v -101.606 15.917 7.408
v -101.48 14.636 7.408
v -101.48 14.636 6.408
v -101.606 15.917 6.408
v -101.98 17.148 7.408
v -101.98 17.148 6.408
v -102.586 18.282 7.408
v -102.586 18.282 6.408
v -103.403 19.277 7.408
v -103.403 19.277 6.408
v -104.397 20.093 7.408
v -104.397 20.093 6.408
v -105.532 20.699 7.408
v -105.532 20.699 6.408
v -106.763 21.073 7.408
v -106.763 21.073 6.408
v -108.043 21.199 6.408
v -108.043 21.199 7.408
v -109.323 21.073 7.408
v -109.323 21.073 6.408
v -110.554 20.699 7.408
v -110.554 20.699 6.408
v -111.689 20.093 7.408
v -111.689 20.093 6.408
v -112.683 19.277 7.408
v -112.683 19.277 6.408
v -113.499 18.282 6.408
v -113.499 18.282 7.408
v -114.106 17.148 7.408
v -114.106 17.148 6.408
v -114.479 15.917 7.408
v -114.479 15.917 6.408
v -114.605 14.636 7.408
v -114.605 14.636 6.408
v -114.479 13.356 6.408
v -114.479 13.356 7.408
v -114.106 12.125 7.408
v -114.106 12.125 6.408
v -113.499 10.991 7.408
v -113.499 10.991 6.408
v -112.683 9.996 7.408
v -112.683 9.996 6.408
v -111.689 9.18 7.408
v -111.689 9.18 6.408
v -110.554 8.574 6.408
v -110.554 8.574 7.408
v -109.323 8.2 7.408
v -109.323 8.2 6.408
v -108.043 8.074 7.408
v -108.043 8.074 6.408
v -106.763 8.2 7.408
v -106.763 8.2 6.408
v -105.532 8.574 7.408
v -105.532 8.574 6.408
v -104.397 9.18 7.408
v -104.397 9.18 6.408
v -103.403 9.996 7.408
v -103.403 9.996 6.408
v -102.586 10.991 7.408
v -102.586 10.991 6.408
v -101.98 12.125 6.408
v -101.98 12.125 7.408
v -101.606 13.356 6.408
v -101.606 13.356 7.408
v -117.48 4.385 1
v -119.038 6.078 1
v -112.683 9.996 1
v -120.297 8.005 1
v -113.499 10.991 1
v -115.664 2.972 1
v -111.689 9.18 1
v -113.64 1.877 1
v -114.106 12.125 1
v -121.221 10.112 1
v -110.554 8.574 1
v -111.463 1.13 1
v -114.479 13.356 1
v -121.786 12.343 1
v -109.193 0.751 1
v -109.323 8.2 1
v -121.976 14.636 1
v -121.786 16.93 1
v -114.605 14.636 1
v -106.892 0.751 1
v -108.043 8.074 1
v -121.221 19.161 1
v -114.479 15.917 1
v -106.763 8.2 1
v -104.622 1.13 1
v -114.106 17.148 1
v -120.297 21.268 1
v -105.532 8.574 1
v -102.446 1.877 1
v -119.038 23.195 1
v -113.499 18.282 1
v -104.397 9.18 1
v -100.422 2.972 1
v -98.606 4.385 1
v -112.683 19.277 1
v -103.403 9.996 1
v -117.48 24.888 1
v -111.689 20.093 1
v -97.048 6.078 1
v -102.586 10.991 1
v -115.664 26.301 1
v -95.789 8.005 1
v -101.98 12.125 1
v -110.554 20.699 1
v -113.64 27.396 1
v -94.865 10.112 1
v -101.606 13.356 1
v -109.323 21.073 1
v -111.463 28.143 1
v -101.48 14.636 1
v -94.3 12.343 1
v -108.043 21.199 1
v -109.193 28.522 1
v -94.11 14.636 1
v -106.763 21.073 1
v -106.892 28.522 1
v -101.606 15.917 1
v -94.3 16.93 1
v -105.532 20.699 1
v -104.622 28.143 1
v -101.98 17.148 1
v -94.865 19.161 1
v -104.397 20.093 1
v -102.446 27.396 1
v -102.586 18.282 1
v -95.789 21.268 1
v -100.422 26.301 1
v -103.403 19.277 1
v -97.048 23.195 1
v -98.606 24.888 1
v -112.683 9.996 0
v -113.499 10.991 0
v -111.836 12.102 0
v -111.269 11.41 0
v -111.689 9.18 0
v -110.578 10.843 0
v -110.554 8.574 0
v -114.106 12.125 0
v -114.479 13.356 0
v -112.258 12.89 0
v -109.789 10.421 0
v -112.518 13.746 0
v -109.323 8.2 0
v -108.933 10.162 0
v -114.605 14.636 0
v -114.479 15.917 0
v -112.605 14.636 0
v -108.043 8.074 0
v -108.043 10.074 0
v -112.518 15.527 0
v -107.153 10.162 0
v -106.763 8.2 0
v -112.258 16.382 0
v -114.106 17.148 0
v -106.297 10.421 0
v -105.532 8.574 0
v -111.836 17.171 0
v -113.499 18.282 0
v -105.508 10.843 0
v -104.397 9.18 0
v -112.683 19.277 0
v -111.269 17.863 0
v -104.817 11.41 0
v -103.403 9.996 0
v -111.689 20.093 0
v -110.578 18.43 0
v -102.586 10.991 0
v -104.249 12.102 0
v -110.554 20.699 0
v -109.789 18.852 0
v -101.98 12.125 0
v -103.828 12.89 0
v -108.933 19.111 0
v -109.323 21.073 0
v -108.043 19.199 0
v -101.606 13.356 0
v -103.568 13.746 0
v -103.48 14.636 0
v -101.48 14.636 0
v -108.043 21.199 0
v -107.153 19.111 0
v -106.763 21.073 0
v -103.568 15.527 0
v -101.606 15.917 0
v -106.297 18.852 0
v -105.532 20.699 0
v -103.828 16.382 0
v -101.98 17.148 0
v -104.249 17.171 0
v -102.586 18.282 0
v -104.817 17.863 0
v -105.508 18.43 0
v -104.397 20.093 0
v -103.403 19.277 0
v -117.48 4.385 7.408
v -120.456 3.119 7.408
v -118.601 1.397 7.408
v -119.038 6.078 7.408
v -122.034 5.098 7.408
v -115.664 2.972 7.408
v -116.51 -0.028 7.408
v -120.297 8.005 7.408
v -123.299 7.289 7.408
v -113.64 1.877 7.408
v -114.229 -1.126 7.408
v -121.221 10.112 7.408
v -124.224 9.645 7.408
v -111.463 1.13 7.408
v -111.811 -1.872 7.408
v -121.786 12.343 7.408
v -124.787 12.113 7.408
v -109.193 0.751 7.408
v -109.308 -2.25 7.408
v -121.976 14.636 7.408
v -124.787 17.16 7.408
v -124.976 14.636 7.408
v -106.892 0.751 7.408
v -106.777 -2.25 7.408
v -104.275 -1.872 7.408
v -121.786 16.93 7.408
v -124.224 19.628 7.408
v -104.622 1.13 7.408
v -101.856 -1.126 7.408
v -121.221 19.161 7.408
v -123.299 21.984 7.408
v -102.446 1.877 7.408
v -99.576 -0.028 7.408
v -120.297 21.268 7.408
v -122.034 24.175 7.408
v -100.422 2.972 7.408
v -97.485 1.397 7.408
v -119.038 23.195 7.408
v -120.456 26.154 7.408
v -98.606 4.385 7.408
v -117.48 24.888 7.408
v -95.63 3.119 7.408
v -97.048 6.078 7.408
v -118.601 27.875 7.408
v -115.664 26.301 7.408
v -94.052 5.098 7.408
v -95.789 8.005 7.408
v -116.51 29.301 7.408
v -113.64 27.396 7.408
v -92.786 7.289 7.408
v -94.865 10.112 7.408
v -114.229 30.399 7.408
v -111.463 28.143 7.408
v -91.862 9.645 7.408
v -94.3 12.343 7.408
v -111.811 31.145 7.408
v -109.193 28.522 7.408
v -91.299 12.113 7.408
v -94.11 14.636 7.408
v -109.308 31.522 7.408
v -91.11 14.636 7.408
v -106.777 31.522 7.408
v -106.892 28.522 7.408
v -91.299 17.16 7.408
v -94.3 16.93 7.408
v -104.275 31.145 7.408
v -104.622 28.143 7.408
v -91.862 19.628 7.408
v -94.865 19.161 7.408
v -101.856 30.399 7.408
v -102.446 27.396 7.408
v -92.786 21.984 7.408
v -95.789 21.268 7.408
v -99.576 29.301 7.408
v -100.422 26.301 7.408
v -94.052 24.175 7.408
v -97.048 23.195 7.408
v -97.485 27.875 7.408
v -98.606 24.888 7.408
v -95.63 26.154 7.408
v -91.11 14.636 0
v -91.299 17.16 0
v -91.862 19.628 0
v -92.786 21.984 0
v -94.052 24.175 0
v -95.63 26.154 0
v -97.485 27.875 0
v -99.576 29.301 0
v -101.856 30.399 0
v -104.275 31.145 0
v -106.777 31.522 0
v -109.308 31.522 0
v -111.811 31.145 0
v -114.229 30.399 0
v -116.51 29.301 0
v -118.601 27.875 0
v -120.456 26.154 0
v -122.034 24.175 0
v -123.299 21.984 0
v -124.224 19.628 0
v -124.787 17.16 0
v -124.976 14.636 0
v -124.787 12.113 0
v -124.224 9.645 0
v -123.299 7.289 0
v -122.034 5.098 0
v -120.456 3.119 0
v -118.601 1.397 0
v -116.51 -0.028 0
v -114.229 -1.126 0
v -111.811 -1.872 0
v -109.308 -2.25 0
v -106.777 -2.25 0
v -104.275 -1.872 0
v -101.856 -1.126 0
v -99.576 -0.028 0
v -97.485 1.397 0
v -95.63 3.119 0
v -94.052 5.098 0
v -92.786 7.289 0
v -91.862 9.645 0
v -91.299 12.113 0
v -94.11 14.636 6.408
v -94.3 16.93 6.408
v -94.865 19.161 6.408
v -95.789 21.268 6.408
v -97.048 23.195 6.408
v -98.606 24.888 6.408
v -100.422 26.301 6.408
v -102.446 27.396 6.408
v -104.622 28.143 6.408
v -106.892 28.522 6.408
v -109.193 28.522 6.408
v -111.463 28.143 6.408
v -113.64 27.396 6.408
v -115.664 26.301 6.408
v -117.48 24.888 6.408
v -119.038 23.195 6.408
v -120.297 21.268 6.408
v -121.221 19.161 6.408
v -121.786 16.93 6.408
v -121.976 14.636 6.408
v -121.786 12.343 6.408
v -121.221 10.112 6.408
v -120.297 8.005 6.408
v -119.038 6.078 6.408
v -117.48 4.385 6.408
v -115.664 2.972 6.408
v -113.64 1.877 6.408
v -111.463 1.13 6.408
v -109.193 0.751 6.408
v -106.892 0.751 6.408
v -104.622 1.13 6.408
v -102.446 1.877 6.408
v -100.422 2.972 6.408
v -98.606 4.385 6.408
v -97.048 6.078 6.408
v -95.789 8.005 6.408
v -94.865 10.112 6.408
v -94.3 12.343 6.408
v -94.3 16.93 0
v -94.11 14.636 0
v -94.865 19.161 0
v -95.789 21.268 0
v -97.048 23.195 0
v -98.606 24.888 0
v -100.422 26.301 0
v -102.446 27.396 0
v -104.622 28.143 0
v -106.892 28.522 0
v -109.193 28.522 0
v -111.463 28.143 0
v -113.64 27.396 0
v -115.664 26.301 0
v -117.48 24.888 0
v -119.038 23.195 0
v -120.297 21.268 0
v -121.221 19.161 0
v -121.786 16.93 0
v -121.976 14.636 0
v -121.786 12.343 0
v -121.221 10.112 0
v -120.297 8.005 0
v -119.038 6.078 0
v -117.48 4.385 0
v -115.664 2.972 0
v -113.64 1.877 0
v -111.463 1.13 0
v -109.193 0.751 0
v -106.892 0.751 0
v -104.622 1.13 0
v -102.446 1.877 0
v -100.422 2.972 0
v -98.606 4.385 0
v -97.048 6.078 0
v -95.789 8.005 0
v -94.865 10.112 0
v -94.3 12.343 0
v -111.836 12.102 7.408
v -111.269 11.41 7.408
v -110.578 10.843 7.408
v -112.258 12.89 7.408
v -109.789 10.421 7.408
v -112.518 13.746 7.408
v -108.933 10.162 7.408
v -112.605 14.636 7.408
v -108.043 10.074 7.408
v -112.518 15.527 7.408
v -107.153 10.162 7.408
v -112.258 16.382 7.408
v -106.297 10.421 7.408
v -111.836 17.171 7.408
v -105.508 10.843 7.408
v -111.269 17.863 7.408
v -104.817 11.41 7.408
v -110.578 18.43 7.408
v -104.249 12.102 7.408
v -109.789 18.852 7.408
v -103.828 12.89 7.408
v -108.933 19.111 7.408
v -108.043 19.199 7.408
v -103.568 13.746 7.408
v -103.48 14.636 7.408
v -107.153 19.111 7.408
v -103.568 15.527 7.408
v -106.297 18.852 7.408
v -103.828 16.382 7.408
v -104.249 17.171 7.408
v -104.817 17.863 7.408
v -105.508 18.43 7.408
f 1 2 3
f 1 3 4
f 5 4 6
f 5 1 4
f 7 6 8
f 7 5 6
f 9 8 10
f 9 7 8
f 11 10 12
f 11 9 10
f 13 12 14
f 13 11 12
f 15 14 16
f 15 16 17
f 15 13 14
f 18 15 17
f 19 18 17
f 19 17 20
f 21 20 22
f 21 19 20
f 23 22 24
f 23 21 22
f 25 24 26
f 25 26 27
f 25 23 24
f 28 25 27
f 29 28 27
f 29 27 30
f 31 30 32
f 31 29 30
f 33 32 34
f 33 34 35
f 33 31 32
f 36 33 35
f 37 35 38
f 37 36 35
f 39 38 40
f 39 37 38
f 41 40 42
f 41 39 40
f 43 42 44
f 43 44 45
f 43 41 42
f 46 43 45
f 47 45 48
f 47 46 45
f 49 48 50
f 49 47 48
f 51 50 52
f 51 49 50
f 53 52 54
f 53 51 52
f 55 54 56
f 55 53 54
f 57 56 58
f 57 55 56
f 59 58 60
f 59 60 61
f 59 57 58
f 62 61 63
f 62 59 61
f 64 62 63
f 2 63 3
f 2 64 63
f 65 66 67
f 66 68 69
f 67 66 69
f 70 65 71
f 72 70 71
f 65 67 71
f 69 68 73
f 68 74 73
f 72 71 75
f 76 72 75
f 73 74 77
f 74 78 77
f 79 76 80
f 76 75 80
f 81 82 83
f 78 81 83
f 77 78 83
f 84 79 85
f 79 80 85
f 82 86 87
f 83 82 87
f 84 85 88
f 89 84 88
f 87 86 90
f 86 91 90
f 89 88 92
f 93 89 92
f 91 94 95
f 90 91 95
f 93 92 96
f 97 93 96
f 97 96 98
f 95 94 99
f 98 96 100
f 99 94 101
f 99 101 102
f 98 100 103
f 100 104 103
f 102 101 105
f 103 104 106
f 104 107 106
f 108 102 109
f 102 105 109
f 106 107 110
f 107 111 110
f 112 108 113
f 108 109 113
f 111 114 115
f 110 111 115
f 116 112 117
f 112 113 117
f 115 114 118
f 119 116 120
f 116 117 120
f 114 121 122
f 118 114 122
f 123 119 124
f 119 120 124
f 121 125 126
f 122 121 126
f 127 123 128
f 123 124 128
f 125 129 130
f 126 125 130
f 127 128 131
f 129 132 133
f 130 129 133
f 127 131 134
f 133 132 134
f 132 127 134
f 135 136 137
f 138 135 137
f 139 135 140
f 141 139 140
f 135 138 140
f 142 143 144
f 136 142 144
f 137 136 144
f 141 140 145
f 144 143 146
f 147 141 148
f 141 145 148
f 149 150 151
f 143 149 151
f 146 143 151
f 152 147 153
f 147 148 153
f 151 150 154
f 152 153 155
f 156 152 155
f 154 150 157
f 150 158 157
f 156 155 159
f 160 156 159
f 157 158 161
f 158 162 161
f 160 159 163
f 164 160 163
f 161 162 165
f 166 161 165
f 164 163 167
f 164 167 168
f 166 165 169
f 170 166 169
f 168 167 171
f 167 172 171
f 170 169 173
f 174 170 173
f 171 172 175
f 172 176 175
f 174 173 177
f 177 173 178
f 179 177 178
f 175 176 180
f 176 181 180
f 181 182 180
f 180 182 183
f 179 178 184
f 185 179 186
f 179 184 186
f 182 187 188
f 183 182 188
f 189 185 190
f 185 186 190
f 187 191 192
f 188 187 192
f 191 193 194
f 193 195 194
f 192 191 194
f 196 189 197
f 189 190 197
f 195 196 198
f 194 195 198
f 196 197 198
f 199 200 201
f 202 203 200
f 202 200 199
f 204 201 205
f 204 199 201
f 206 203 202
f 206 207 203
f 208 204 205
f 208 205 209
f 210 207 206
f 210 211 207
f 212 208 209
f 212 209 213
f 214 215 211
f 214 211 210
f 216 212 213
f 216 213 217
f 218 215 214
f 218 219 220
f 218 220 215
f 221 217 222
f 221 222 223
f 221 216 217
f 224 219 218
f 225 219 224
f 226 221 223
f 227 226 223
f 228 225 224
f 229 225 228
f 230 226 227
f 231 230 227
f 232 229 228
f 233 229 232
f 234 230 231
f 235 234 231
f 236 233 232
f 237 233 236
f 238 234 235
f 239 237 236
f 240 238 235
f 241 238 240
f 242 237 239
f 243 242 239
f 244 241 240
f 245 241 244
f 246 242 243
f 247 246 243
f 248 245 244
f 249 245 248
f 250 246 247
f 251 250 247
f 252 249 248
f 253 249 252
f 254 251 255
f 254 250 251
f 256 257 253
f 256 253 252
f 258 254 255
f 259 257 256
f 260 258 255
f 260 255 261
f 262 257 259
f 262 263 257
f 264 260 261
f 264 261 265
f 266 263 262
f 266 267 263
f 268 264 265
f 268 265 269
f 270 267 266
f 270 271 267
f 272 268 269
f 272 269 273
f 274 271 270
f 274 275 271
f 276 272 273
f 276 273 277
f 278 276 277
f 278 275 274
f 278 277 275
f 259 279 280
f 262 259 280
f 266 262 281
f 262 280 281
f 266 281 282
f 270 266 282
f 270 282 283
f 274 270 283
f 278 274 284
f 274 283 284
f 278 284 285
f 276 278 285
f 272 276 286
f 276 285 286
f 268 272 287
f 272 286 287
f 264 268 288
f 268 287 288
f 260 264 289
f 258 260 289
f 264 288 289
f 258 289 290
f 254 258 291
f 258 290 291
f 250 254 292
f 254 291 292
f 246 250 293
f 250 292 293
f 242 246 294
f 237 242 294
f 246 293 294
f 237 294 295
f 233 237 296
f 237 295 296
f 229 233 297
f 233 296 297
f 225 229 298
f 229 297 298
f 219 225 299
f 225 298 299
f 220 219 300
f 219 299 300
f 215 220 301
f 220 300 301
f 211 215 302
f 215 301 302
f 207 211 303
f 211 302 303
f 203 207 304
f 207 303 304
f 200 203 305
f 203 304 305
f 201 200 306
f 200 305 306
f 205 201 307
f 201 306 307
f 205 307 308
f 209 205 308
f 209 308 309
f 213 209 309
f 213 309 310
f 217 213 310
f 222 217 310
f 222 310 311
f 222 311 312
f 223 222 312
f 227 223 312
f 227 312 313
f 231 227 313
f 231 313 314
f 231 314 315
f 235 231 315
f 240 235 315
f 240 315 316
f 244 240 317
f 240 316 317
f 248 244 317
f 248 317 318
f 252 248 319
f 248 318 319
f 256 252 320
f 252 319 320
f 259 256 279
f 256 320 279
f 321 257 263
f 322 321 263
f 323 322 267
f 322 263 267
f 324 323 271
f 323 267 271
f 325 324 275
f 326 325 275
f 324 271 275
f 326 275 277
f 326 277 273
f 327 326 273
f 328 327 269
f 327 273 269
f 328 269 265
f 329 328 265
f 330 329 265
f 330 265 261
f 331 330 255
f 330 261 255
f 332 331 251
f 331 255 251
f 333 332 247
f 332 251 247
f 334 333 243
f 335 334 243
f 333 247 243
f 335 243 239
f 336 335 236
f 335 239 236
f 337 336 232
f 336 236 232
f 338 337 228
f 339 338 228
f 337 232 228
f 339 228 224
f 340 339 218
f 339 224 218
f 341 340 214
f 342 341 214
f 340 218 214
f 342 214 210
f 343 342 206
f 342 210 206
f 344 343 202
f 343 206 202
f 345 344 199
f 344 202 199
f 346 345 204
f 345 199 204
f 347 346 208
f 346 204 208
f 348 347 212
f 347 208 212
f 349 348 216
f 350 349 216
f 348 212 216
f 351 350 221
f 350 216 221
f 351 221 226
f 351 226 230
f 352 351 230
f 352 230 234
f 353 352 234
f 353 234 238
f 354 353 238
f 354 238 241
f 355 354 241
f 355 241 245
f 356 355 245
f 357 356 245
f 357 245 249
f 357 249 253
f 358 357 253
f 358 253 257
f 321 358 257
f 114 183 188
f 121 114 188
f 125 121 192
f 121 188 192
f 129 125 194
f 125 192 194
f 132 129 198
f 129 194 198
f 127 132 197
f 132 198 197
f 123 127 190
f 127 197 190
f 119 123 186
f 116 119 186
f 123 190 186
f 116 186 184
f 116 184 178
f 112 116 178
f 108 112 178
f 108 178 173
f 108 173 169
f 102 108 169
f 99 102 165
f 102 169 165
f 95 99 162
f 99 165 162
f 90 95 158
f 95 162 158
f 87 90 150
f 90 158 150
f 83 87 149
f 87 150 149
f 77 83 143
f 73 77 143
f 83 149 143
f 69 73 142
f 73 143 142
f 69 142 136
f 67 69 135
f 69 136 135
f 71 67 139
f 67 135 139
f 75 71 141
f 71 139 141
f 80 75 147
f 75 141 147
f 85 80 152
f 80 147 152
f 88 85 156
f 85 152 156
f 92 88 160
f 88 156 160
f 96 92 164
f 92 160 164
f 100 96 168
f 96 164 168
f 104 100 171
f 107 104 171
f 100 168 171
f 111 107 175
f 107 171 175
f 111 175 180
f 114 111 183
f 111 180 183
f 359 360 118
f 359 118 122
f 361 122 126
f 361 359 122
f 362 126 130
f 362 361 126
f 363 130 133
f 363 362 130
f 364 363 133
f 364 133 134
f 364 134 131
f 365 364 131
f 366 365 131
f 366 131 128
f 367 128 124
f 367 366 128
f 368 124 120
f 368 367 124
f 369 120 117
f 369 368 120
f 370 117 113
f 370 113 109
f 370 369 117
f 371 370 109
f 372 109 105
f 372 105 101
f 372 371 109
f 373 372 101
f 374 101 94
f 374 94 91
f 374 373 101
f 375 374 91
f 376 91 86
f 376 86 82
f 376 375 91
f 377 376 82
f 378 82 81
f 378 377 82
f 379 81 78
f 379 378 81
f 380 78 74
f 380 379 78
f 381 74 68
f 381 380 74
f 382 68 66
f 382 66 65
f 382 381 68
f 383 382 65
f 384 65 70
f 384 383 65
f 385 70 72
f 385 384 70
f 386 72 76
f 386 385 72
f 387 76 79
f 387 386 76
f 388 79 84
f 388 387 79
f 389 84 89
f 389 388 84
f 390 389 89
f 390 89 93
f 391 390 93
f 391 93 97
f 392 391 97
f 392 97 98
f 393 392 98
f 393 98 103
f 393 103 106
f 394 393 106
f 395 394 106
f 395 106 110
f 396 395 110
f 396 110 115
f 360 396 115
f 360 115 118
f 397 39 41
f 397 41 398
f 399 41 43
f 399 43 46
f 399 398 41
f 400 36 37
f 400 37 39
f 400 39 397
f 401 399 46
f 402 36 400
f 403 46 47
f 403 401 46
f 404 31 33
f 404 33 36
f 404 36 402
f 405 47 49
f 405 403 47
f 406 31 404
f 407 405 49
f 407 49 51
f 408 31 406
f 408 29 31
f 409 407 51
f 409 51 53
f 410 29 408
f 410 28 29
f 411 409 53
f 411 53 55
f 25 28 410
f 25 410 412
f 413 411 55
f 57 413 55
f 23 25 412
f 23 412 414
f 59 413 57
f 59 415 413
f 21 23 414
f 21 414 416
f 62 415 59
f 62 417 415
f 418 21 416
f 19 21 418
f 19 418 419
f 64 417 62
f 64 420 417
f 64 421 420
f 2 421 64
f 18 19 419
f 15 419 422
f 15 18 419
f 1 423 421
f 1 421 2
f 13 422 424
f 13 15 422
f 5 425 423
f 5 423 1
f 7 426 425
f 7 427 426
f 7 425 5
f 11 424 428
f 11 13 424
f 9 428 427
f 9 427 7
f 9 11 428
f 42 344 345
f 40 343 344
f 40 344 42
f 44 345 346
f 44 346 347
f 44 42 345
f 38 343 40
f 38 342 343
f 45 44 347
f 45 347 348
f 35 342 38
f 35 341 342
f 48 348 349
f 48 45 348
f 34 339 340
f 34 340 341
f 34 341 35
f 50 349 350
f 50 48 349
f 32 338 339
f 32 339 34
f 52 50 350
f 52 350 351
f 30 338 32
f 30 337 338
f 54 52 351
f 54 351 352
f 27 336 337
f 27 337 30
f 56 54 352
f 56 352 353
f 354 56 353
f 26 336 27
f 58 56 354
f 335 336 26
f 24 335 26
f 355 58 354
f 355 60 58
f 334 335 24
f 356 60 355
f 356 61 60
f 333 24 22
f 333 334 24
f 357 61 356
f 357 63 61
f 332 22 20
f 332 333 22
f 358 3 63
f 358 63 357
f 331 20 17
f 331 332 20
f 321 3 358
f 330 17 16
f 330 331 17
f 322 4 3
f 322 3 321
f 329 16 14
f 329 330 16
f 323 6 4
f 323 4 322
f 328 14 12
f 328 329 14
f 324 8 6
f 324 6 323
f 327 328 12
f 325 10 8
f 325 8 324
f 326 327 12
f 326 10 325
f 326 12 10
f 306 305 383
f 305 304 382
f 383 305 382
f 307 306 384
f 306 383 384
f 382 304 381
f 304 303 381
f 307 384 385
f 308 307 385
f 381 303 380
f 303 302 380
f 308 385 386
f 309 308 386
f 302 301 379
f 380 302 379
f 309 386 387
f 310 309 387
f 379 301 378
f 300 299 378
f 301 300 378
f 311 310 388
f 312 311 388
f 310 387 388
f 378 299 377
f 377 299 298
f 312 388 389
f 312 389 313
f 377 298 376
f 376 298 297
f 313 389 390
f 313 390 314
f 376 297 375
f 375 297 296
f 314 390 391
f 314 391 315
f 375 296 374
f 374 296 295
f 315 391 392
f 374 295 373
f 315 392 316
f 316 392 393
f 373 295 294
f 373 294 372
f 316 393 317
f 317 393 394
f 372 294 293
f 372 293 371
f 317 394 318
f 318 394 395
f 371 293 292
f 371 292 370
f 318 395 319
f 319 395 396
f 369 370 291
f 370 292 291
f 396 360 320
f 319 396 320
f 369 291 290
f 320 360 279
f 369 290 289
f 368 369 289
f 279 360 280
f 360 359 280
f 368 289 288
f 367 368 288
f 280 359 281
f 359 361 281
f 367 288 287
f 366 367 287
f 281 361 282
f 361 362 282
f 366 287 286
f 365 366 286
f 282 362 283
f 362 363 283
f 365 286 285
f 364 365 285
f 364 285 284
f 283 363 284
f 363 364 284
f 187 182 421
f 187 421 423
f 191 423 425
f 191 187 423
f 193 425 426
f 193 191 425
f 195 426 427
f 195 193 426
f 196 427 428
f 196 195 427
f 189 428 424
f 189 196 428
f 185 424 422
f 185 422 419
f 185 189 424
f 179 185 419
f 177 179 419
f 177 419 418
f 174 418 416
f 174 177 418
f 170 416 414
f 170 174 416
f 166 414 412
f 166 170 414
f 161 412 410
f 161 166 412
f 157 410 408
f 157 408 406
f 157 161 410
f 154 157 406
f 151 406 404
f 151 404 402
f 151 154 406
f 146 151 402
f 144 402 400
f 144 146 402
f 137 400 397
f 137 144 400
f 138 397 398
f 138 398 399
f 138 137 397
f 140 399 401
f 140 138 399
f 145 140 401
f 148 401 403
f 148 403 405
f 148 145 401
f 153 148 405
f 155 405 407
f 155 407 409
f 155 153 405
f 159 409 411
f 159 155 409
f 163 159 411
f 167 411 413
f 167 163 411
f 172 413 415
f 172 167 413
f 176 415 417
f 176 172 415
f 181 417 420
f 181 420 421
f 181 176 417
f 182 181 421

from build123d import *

# Parameters (mm, degrees)
SKETCH1_R           = 16.933333333
SKETCH1_R_2         = 4.5625
BOSS_EXTRUDE1_DEPTH = 7.408333333
SKETCH2_R           = 13.933333333
SKETCH2_R_2         = 6.5625
CUT_EXTRUDE1_DEPTH  = 1


with BuildPart() as part:
    # Sketch1 → Boss-Extrude1 (new body)
    with BuildSketch(Plane.XY):
        with Locations((-108.042890629, 14.636479869)):
            Circle(SKETCH1_R)
        with Locations((-108.042890629, 14.636479869)):
            Circle(SKETCH1_R_2, mode=Mode.SUBTRACT)
    extrude(amount=BOSS_EXTRUDE1_DEPTH)

    # Sketch2 → Cut-Extrude1 (cut)
    with BuildSketch(Plane.XY.offset(7.408333333)):
        with Locations((-108.042890629, 14.636479869)):
            Circle(SKETCH2_R)
        with Locations((-108.042890629, 14.636479869)):
            Circle(SKETCH2_R_2, mode=Mode.SUBTRACT)
    cut_extrude1 = extrude(amount=-CUT_EXTRUDE1_DEPTH, mode=Mode.SUBTRACT)

    # Mirror1: Cut-Extrude1 across plane
    add(cut_extrude1.mirror(Plane.XY.offset(3.704166667)), mode=Mode.SUBTRACT)


solid = part.part
